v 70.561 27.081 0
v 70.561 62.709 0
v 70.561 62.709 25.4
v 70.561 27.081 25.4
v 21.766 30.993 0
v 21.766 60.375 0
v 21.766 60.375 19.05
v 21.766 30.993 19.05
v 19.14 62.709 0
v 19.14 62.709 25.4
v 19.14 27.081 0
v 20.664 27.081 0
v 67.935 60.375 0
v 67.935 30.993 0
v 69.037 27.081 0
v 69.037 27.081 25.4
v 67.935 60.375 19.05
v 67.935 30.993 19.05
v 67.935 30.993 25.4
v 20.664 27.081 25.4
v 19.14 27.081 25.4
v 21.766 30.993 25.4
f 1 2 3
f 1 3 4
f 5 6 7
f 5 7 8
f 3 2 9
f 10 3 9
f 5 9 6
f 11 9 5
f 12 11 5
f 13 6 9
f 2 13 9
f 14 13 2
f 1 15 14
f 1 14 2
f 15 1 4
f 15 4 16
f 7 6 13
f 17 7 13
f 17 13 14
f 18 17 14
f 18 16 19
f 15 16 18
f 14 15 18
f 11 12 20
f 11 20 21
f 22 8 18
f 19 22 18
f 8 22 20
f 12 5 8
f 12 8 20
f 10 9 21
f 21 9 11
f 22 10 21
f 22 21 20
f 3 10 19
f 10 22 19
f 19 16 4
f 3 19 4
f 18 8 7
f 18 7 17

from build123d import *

# Parameters (mm, degrees)
F1_DEPTH = 25.4
F2_W     = 46.1691659327
F2_H     = 29.3826218694
F3_DEPTH = 19.05
F5_DEPTH = 25.4


with BuildPart() as f1:
    # F0 (on Top) → F1 (new body)
    with BuildSketch(Plane.XY):
        Polygon((70.5610662699, 62.708877027), (19.1396083683, 62.708877027), (19.1396083683, 30.9927258641), (22.5176624954, 30.9927258641), (68.1213587523, 30.9927258641), (70.5610662699, 30.9927258641), align=None)
    extrude(amount=F1_DEPTH)

    # F2 (on face) → F3 (cut)
    with BuildSketch(Plane(origin=(0, 0, 0), x_dir=(1, 0, 0), z_dir=(0, 0, -1))):
        with Locations((44.8503373191, -45.6840367988)):
            Rectangle(F2_W, F2_H)
    extrude(amount=-F3_DEPTH, mode=Mode.SUBTRACT)

    # F4 (on face) → F5 (join)
    with BuildSketch(Plane(origin=(0, 0, 0), x_dir=(1, 0, 0), z_dir=(0, 0, -1))):
        Polygon((67.9349202854, -30.9927258641), (70.5610662699, -30.9927258641), (70.5610662699, -27.0810292719), (69.0370662699, -27.0810292719), align=None)
        Polygon((19.1396083683, -27.0810292719), (19.1396083683, -30.9927258641), (21.7657543527, -30.9927258641), (20.6636083683, -27.0810292719), align=None)
    extrude(amount=-F5_DEPTH)


solid = f1.part
